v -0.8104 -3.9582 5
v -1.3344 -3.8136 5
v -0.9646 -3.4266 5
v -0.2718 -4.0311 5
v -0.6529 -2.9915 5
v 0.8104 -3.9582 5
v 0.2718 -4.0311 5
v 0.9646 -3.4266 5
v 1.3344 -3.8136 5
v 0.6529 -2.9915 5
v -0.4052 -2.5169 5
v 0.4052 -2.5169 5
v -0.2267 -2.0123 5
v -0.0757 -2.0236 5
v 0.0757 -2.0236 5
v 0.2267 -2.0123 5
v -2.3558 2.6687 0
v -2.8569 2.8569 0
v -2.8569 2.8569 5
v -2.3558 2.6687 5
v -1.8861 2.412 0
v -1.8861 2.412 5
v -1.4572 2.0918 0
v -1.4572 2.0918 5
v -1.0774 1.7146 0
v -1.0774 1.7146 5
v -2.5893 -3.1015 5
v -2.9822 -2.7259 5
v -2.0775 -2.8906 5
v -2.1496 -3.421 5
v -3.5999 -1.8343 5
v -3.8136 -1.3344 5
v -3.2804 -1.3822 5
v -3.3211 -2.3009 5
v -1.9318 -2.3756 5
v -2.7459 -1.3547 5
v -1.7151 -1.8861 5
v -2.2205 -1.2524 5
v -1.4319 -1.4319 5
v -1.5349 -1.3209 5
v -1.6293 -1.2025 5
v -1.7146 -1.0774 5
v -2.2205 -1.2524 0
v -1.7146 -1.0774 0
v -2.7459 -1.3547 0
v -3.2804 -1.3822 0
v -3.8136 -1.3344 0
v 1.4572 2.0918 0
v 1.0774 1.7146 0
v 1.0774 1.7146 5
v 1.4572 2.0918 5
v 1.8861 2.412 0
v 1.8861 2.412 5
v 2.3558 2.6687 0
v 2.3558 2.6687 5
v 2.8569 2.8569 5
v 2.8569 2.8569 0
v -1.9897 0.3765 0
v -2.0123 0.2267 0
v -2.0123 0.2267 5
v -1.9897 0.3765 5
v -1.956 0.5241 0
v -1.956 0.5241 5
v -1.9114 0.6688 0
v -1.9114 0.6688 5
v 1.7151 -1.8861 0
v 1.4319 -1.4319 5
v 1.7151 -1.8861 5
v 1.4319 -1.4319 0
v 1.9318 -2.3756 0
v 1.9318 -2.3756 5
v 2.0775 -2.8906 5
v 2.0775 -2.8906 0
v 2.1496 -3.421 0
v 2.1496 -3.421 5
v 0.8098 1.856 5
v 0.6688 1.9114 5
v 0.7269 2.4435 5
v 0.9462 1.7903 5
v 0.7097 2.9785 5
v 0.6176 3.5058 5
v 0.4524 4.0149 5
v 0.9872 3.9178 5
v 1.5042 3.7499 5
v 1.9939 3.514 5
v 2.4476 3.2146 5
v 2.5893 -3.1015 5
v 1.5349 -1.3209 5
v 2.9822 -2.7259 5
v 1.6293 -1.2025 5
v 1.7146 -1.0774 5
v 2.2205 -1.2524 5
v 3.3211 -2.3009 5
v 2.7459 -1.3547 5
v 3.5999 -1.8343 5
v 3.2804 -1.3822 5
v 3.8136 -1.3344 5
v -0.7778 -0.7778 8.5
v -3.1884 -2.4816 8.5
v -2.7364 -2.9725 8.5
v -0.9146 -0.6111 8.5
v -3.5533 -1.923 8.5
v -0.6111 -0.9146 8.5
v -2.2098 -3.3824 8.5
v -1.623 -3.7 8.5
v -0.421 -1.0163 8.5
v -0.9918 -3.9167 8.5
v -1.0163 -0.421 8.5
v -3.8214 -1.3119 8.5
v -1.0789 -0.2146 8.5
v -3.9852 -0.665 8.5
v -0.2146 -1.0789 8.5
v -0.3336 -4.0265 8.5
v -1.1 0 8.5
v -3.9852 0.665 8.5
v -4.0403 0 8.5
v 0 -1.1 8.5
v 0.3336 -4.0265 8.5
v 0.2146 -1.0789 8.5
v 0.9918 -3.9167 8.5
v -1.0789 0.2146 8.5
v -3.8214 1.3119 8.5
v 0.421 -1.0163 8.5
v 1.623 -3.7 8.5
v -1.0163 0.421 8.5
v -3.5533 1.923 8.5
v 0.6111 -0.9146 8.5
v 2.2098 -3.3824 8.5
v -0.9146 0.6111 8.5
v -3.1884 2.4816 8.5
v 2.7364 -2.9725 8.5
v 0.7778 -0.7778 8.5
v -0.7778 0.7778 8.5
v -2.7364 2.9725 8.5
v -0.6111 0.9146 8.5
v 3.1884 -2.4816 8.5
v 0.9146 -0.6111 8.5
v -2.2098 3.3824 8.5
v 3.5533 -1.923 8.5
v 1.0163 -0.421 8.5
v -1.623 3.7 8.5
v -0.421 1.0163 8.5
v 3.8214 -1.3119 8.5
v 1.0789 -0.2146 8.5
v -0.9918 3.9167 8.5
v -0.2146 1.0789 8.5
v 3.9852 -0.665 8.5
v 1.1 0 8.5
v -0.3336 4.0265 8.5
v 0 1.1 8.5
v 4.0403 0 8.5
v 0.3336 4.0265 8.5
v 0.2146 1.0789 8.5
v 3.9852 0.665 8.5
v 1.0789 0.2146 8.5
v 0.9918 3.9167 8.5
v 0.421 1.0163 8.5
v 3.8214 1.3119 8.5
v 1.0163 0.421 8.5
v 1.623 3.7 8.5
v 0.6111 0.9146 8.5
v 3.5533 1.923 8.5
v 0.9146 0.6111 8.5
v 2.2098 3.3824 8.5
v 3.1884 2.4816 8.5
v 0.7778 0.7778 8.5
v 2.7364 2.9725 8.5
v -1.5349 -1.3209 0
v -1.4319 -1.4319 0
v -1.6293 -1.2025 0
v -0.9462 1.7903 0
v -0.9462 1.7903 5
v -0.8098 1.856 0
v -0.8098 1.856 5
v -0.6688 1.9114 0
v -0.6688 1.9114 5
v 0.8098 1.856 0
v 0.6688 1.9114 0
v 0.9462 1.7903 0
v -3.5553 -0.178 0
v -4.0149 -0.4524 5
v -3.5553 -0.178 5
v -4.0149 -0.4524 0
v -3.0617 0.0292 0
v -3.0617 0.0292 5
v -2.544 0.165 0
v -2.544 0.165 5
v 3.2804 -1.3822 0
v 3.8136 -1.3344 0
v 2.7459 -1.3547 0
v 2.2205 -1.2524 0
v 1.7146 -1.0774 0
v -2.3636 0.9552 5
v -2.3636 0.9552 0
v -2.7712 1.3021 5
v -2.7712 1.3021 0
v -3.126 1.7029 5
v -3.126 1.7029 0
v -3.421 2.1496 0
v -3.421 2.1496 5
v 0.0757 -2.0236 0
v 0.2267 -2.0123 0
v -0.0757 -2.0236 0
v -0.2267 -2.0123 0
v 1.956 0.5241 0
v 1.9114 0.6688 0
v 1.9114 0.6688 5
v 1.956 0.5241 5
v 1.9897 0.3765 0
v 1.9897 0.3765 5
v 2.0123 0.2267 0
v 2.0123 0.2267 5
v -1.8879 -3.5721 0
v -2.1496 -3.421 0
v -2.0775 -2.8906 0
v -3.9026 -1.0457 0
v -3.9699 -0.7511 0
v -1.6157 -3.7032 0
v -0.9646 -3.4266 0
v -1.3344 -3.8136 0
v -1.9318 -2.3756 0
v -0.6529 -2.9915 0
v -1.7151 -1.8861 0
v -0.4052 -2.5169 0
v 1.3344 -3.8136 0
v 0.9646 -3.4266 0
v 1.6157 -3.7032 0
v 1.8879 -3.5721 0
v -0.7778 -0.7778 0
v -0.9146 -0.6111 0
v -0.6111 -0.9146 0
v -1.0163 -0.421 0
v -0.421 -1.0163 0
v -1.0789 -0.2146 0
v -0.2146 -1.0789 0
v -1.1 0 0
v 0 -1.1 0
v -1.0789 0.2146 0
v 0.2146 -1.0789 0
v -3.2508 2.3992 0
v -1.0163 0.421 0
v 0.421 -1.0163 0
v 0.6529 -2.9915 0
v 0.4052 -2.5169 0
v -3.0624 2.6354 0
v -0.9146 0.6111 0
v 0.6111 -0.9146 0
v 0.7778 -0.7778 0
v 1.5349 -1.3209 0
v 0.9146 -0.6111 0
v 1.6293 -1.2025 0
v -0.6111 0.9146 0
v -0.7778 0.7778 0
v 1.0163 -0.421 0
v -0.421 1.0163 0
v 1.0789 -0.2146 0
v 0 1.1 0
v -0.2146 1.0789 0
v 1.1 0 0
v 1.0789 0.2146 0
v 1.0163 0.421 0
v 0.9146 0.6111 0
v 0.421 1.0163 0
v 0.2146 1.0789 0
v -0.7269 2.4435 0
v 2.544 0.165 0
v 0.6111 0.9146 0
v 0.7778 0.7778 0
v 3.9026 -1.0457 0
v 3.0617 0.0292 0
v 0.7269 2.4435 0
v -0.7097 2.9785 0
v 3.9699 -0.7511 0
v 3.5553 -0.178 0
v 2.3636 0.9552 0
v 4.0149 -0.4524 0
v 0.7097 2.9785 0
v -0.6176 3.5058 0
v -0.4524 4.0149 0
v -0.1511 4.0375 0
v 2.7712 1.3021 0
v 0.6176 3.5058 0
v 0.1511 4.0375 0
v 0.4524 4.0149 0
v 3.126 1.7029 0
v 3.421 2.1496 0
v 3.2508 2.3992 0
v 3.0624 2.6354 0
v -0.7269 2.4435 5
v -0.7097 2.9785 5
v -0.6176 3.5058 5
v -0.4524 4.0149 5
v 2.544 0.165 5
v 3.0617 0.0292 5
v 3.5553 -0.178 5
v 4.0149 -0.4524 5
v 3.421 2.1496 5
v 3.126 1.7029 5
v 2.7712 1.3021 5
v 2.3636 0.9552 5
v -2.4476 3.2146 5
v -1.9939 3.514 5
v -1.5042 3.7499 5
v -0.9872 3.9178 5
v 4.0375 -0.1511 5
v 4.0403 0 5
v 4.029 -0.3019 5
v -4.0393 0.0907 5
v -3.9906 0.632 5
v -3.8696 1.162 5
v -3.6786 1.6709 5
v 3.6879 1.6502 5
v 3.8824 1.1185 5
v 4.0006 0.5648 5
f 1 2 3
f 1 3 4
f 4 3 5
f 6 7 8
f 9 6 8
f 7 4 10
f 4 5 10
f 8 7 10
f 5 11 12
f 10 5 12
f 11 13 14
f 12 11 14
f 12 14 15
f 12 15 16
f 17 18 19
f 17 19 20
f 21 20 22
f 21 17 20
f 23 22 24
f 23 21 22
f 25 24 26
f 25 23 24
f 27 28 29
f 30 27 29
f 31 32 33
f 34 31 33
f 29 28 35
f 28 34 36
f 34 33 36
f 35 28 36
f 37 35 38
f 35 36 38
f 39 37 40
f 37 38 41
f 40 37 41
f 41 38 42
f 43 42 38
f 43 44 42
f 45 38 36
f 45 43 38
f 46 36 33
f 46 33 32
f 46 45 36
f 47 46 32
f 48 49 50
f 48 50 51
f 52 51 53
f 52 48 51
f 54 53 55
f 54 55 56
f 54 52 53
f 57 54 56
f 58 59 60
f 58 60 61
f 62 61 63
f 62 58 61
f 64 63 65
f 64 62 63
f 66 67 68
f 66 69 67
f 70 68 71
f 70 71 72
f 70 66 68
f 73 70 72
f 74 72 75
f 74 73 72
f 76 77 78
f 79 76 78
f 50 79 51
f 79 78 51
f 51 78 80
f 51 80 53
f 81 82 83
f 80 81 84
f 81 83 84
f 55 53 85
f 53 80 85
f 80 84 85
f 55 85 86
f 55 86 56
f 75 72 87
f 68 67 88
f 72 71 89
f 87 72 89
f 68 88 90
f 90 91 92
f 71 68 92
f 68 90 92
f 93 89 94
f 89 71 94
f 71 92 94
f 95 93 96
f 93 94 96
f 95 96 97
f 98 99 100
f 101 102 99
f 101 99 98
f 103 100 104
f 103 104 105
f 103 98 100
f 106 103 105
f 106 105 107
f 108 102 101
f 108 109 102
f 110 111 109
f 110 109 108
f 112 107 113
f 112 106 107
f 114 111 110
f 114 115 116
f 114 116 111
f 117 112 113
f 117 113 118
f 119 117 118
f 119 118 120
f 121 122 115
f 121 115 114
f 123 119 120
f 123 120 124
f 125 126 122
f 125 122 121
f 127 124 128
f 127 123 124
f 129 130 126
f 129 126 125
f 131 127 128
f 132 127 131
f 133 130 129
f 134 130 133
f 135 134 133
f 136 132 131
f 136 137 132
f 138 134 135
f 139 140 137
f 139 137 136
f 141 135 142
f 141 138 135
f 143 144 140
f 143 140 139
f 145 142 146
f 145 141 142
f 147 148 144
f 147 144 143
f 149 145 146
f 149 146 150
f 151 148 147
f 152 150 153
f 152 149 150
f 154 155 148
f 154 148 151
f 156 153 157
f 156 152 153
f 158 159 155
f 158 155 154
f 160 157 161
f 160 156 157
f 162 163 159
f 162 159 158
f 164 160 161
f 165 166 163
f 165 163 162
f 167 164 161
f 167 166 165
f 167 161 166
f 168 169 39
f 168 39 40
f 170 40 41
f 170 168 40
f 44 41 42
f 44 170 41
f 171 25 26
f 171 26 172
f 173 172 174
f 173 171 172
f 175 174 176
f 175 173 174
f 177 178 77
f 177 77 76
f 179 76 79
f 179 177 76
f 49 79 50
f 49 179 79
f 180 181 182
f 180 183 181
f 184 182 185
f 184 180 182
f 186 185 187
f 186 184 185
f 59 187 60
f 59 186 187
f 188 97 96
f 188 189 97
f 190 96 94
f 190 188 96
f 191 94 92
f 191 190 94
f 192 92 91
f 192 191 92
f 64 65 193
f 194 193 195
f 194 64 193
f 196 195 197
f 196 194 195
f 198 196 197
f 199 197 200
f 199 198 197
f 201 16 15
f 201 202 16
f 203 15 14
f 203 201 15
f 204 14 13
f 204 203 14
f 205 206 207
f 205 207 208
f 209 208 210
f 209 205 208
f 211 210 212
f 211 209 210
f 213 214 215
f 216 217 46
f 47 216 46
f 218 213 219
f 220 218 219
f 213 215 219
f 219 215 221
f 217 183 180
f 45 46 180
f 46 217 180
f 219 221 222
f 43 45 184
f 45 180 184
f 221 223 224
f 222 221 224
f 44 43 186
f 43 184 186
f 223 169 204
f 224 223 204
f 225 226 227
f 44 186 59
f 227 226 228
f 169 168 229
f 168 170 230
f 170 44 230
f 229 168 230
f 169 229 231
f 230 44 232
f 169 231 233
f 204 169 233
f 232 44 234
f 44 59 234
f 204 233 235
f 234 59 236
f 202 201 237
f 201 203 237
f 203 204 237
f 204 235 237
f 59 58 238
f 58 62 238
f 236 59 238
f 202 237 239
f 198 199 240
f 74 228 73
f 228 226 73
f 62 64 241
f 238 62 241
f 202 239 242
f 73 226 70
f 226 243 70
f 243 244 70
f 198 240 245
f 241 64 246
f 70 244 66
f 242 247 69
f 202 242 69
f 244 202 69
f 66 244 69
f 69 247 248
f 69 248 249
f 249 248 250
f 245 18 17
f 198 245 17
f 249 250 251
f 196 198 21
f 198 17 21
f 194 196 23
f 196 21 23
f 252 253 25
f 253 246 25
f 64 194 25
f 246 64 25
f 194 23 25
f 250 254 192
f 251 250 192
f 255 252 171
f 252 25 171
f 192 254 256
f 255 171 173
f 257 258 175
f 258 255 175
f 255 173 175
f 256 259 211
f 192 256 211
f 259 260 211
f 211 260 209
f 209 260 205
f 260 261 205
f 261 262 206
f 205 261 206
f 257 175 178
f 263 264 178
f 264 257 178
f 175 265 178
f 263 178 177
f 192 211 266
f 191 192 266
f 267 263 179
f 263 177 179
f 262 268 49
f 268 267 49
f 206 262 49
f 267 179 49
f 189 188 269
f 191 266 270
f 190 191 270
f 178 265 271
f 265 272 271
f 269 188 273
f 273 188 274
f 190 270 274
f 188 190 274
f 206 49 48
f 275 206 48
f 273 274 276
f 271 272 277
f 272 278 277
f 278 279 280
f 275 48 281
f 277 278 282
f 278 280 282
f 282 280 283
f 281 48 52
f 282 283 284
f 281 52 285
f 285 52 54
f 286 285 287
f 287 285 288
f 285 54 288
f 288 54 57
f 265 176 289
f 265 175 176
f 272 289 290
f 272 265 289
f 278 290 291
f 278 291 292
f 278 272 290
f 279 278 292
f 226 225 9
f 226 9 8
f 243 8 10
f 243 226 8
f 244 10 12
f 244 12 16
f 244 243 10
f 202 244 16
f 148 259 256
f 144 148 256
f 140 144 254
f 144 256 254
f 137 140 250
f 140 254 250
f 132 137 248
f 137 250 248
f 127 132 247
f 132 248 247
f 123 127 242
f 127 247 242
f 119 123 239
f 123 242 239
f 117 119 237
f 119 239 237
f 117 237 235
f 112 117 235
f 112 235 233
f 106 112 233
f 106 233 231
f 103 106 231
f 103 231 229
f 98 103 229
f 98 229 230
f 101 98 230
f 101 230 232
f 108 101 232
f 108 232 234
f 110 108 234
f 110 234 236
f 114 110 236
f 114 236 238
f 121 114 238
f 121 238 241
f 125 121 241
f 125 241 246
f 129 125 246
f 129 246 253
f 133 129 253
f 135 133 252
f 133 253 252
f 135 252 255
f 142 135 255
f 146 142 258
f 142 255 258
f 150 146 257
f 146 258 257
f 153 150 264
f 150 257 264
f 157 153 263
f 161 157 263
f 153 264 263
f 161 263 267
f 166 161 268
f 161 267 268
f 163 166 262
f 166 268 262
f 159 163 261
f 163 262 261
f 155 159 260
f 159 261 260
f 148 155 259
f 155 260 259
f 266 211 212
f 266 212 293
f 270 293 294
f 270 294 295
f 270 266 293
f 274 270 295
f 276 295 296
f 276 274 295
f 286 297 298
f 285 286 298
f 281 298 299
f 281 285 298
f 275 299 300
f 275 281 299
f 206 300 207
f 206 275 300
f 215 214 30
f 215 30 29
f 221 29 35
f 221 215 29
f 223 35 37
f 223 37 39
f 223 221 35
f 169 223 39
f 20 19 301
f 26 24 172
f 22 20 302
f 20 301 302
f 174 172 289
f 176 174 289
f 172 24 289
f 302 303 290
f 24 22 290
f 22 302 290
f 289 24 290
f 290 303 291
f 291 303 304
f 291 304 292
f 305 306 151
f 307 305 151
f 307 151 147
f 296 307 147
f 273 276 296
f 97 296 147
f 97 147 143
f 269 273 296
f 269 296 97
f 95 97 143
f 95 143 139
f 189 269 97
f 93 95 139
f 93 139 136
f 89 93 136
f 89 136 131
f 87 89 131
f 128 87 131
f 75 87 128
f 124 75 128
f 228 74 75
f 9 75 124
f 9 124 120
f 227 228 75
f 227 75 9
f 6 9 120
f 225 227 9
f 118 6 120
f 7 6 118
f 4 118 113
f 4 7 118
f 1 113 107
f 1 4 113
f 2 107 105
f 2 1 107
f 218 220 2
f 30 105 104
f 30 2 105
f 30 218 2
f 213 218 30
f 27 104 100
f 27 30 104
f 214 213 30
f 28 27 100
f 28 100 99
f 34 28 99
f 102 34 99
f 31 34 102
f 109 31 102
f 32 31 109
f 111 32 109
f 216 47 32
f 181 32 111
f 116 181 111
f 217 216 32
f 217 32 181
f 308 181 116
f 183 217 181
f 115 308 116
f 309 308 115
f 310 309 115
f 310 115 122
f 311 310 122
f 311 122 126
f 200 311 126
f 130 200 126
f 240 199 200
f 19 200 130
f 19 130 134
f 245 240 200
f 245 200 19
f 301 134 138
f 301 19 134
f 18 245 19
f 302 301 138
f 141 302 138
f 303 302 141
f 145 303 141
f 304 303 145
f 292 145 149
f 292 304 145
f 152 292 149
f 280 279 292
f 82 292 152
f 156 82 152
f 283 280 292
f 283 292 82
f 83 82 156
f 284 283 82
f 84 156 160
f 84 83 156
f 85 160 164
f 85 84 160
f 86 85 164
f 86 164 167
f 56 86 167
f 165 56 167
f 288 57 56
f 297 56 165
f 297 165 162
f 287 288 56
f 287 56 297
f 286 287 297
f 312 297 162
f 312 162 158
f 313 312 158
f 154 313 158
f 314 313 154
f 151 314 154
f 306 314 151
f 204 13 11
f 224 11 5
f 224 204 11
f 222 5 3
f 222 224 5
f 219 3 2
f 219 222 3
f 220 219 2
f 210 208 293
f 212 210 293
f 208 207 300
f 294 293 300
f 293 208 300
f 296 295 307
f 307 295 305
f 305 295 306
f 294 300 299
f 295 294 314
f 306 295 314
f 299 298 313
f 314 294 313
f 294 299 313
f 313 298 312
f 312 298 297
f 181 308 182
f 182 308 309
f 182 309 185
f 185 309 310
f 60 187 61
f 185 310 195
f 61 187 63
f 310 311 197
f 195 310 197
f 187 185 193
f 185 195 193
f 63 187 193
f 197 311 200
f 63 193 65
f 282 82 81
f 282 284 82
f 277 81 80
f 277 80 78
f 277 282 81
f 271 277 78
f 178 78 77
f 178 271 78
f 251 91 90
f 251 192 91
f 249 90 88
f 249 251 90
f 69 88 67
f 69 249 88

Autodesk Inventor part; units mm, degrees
sketch "Sketch1" plane through (0, 0, 0) normal (0, 0, 1) x (1, 0, 0)
  circle A0 centre (0, 0) radius 4.0403
  dimension "d0" = 8.0806
extrude "Extrusion1" add sketch "Sketch1" along normal blind 5
ref_plane "Work Plane2" through (0, 0, 2.5) normal (0, 0, 1) x (1, 0, 0)
sketch "Sketch2" plane through (0, 0, 0) normal (0, 0, -1) x (-1, 0, 0)
  circle A0 centre (0, 0) radius 4.0403 projected
  circle A1 centre (0, 0) radius 3.15
  dimension "d3" = 6.3
surface extrude "ピッチ円直径" sketch "Sketch2" against normal through all shown no curves A1
ref_plane "Work Plane8" through (0, 0, 0) normal (0.9009689, 0.4338837, 0) x (0, 0, 1)
ref_plane "Work Plane9" through (0, 0, 0) normal (1, 0, 0) x (0, 1, 0)
spur gear teeth "平歯車" teeth 7 pitch diameter 6.3 tip diameter 8.0806 root diameter 4.05 face width 5 start plane through (0, 0, 0) normal (0, 0, -1) x (-1, 0, 0)
sketch "スケッチ3" plane through (0, 0, 5) normal (0, 0, 1) x (1, 0, 0)
  arc A0 (-0.6688, 1.9114) -> (-1.0774, 1.7146) centre (0, 0) ccw construction
  circle A1 centre (0, 0) radius 2.025
  circle A2 centre (0, 0) radius 1.1
  circle A3 centre (0, 0) radius 4.0403
  arc A4 (1.3344, -3.8136) -> (2.1496, -3.421) centre (0, 0) ccw construction
  dimension "d49" = 2.2
extrude "押し出し2" add sketch "スケッチ3" along normal blind 3.5 contours A1 | A2
extrude "押し出し3" cut sketch "スケッチ3" along normal blind 10 from surface at -5 contours A2
extrude "押し出し4" add sketch "スケッチ3" along normal up to surface (3.5 mm away) contours A3
equation "\"d0\" = da_da"
equation "\"d1\" = da_b"
equation "\"d3\" = da_d"
equation "\"d16\" = da_aw"
equation "\"d43\" = da_aw"
equation "\"d46\" = da_aw"
equation "\"da_da\" = 8.080619"
equation "\"da_b\" = 5"
equation "\"da_d\" = 6.3"
equation "\"da_aw\" = 13.23747"
properties part number "平歯車1" material "Steel"
